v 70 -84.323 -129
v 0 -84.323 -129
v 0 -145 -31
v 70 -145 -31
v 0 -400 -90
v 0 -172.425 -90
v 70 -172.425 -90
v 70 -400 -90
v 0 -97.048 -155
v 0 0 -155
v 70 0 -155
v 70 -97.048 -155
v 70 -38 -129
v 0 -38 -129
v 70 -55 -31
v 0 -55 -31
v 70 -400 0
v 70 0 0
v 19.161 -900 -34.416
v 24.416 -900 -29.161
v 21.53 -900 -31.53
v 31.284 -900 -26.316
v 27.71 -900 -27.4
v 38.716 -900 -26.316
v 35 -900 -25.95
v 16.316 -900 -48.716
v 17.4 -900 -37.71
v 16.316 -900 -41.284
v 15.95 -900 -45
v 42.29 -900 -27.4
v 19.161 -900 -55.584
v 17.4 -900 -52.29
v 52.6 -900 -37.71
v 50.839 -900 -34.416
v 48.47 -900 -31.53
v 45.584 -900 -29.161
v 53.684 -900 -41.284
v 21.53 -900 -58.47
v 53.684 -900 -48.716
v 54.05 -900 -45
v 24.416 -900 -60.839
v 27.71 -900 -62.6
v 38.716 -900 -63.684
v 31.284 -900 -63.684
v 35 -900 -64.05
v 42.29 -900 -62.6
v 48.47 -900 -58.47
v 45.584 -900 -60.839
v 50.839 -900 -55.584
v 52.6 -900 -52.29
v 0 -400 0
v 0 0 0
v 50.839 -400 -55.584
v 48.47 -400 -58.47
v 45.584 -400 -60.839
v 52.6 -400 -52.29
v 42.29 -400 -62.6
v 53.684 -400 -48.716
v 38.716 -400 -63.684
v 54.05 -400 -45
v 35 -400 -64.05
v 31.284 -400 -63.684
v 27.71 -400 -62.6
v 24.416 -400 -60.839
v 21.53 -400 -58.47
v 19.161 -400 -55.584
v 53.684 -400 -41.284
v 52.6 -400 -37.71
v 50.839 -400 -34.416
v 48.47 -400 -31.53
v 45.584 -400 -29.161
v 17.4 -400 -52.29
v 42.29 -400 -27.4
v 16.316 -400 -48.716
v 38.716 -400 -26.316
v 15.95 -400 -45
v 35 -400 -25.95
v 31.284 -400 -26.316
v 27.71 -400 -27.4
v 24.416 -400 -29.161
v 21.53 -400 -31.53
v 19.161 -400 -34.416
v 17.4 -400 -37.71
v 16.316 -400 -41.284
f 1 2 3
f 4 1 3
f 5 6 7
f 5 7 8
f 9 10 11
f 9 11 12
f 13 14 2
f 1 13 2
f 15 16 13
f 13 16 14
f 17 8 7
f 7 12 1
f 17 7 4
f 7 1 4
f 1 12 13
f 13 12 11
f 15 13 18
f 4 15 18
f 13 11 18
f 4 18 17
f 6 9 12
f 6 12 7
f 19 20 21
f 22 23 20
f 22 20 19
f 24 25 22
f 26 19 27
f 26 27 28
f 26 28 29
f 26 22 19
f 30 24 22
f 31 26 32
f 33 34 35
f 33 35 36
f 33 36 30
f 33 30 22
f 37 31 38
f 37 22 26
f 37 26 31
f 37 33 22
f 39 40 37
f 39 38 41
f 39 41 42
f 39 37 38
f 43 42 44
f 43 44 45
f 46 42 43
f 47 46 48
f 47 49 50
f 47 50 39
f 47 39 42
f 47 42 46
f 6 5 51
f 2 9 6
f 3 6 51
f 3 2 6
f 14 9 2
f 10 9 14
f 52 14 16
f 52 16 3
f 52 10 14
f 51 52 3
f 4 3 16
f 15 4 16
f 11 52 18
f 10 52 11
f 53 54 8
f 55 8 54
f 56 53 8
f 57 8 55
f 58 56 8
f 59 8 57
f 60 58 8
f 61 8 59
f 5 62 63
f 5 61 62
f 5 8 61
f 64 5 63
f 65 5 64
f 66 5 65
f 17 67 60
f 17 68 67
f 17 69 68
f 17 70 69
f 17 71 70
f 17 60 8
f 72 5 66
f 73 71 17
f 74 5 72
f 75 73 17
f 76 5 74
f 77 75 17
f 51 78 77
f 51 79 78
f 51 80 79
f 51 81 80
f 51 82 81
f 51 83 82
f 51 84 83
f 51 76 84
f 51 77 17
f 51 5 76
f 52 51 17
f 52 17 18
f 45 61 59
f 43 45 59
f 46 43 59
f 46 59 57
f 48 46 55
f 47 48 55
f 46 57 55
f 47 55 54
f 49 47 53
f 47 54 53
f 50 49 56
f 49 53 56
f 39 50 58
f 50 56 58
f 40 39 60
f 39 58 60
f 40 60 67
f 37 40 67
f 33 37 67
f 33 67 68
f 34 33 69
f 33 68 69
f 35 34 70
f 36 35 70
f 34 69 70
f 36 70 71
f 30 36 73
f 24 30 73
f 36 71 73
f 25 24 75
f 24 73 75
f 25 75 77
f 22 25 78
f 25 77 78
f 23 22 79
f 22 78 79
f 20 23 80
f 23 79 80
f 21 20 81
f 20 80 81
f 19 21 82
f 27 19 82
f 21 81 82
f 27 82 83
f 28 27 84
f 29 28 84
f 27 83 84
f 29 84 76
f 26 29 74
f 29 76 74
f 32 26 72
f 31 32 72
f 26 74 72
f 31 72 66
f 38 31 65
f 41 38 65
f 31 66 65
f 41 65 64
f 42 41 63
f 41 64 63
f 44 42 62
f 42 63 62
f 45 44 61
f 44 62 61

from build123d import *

# Parameters (mm, degrees)
BOSS_EXTRUDE1_DEPTH     = 70
CUT_EXTRUDE1_DEPTH      = 435.655035632
CUT_EXTRUDE1_DEPTH_BACK = 435.655035632
SKETCH4_R               = 19.05
BOSS_EXTRUDE2_DEPTH     = 500


with BuildPart() as part:
    # Sketch2 → Boss-Extrude1 (new body)
    with BuildSketch(Plane(origin=(0, 0, 0), x_dir=(0, 0, -1), z_dir=(1, 0, 0))):
        Polygon((0, 0), (155, 0), (155, -97.047904462), (90, -172.424894861), (90, -400), (0, -400), align=None)
    extrude(amount=BOSS_EXTRUDE1_DEPTH)

    # Sketch3 → Cut-Extrude1 (cut, two sides: drawn at the far end of the back side and taken through both)
    with BuildSketch(Plane(origin=(70, 0, 0), x_dir=(0, 0, -1), z_dir=(1, 0, 0)).offset(-CUT_EXTRUDE1_DEPTH_BACK)):
        Polygon((31, -55), (129, -38), (129, -84.32322248), (31, -145), align=None)
    extrude(amount=CUT_EXTRUDE1_DEPTH + CUT_EXTRUDE1_DEPTH_BACK, mode=Mode.SUBTRACT)

    # Sketch4 → Boss-Extrude2 (add)
    with BuildSketch(Plane.XZ.offset(400)):
        with Locations(Location((35, -45, 0), (0, 0, 270))):
            Circle(SKETCH4_R)
    extrude(amount=BOSS_EXTRUDE2_DEPTH)


solid = part.part
